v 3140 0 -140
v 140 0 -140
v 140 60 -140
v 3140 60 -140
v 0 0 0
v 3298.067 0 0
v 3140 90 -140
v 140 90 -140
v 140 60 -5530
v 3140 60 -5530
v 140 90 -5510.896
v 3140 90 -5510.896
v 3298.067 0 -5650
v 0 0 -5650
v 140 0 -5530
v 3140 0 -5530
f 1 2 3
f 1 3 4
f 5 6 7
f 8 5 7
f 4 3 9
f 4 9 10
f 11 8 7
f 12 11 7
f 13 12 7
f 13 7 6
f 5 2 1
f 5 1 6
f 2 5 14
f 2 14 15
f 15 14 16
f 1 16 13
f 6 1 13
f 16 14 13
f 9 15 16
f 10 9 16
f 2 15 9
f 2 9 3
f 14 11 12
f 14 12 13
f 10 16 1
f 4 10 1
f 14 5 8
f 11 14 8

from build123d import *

# Parameters (mm, degrees)
SKETCH_1_W          = 3298.067470497
SKETCH_1_H          = 5650
EXTRUDE_1_DEPTH     = 90
SKETCH_2_OUTSIDE_W  = 4608.621
SKETCH_2_OUTSIDE_H  = 1400.554
CUT_EXTRUDE_1_DEPTH = 5651
SKETCH_3_OUTSIDE_W  = 6960.554
SKETCH_3_OUTSIDE_H  = 1400.554
CUT_EXTRUDE_4_DEPTH = 3299.067470497
SKETCH_4_W          = 3000
SKETCH_4_H          = 5390
CUT_EXTRUDE_5_DEPTH = 60


with BuildPart() as part:
    # Эскиз1 → Бобышка-Вытянуть1 (new body)
    with BuildSketch(Plane(origin=(0, 0, 0), x_dir=(1, 0, 0), z_dir=(0, 1, 0))):
        with Locations((1649.033735249, 2825)):
            Rectangle(SKETCH_1_W, SKETCH_1_H)
    extrude(amount=EXTRUDE_1_DEPTH)

    # Эскиз2 outside → Вырез-Вытянуть1 (cut, through all)
    with BuildSketch(Plane.XY):
        with Locations((1649.0335, 45)):
            Rectangle(SKETCH_2_OUTSIDE_W, SKETCH_2_OUTSIDE_H)
        Polygon((0, 0), (140, 90), (3140, 90), (3298.067470497, 0), align=None, mode=Mode.SUBTRACT)
    extrude(amount=-CUT_EXTRUDE_1_DEPTH, mode=Mode.SUBTRACT)

    # Эскиз3 outside → Вырез-Вытянуть4 (cut, through all)
    with BuildSketch(Plane(origin=(0, 0, 0), x_dir=(0, 0, -1), z_dir=(1, 0, 0))):
        with Locations((2825, 45)):
            Rectangle(SKETCH_3_OUTSIDE_W, SKETCH_3_OUTSIDE_H)
        Polygon((0, 0), (140, 90), (5510.895976381, 90), (5650, 0), align=None, mode=Mode.SUBTRACT)
    extrude(amount=CUT_EXTRUDE_4_DEPTH, mode=Mode.SUBTRACT)

    # Эскиз4 → Вырез-Вытянуть5 (cut)
    with BuildSketch(Plane.XZ):
        with Locations((1640, -2835)):
            Rectangle(SKETCH_4_W, SKETCH_4_H)
    extrude(amount=-CUT_EXTRUDE_5_DEPTH, mode=Mode.SUBTRACT)


solid = part.part
